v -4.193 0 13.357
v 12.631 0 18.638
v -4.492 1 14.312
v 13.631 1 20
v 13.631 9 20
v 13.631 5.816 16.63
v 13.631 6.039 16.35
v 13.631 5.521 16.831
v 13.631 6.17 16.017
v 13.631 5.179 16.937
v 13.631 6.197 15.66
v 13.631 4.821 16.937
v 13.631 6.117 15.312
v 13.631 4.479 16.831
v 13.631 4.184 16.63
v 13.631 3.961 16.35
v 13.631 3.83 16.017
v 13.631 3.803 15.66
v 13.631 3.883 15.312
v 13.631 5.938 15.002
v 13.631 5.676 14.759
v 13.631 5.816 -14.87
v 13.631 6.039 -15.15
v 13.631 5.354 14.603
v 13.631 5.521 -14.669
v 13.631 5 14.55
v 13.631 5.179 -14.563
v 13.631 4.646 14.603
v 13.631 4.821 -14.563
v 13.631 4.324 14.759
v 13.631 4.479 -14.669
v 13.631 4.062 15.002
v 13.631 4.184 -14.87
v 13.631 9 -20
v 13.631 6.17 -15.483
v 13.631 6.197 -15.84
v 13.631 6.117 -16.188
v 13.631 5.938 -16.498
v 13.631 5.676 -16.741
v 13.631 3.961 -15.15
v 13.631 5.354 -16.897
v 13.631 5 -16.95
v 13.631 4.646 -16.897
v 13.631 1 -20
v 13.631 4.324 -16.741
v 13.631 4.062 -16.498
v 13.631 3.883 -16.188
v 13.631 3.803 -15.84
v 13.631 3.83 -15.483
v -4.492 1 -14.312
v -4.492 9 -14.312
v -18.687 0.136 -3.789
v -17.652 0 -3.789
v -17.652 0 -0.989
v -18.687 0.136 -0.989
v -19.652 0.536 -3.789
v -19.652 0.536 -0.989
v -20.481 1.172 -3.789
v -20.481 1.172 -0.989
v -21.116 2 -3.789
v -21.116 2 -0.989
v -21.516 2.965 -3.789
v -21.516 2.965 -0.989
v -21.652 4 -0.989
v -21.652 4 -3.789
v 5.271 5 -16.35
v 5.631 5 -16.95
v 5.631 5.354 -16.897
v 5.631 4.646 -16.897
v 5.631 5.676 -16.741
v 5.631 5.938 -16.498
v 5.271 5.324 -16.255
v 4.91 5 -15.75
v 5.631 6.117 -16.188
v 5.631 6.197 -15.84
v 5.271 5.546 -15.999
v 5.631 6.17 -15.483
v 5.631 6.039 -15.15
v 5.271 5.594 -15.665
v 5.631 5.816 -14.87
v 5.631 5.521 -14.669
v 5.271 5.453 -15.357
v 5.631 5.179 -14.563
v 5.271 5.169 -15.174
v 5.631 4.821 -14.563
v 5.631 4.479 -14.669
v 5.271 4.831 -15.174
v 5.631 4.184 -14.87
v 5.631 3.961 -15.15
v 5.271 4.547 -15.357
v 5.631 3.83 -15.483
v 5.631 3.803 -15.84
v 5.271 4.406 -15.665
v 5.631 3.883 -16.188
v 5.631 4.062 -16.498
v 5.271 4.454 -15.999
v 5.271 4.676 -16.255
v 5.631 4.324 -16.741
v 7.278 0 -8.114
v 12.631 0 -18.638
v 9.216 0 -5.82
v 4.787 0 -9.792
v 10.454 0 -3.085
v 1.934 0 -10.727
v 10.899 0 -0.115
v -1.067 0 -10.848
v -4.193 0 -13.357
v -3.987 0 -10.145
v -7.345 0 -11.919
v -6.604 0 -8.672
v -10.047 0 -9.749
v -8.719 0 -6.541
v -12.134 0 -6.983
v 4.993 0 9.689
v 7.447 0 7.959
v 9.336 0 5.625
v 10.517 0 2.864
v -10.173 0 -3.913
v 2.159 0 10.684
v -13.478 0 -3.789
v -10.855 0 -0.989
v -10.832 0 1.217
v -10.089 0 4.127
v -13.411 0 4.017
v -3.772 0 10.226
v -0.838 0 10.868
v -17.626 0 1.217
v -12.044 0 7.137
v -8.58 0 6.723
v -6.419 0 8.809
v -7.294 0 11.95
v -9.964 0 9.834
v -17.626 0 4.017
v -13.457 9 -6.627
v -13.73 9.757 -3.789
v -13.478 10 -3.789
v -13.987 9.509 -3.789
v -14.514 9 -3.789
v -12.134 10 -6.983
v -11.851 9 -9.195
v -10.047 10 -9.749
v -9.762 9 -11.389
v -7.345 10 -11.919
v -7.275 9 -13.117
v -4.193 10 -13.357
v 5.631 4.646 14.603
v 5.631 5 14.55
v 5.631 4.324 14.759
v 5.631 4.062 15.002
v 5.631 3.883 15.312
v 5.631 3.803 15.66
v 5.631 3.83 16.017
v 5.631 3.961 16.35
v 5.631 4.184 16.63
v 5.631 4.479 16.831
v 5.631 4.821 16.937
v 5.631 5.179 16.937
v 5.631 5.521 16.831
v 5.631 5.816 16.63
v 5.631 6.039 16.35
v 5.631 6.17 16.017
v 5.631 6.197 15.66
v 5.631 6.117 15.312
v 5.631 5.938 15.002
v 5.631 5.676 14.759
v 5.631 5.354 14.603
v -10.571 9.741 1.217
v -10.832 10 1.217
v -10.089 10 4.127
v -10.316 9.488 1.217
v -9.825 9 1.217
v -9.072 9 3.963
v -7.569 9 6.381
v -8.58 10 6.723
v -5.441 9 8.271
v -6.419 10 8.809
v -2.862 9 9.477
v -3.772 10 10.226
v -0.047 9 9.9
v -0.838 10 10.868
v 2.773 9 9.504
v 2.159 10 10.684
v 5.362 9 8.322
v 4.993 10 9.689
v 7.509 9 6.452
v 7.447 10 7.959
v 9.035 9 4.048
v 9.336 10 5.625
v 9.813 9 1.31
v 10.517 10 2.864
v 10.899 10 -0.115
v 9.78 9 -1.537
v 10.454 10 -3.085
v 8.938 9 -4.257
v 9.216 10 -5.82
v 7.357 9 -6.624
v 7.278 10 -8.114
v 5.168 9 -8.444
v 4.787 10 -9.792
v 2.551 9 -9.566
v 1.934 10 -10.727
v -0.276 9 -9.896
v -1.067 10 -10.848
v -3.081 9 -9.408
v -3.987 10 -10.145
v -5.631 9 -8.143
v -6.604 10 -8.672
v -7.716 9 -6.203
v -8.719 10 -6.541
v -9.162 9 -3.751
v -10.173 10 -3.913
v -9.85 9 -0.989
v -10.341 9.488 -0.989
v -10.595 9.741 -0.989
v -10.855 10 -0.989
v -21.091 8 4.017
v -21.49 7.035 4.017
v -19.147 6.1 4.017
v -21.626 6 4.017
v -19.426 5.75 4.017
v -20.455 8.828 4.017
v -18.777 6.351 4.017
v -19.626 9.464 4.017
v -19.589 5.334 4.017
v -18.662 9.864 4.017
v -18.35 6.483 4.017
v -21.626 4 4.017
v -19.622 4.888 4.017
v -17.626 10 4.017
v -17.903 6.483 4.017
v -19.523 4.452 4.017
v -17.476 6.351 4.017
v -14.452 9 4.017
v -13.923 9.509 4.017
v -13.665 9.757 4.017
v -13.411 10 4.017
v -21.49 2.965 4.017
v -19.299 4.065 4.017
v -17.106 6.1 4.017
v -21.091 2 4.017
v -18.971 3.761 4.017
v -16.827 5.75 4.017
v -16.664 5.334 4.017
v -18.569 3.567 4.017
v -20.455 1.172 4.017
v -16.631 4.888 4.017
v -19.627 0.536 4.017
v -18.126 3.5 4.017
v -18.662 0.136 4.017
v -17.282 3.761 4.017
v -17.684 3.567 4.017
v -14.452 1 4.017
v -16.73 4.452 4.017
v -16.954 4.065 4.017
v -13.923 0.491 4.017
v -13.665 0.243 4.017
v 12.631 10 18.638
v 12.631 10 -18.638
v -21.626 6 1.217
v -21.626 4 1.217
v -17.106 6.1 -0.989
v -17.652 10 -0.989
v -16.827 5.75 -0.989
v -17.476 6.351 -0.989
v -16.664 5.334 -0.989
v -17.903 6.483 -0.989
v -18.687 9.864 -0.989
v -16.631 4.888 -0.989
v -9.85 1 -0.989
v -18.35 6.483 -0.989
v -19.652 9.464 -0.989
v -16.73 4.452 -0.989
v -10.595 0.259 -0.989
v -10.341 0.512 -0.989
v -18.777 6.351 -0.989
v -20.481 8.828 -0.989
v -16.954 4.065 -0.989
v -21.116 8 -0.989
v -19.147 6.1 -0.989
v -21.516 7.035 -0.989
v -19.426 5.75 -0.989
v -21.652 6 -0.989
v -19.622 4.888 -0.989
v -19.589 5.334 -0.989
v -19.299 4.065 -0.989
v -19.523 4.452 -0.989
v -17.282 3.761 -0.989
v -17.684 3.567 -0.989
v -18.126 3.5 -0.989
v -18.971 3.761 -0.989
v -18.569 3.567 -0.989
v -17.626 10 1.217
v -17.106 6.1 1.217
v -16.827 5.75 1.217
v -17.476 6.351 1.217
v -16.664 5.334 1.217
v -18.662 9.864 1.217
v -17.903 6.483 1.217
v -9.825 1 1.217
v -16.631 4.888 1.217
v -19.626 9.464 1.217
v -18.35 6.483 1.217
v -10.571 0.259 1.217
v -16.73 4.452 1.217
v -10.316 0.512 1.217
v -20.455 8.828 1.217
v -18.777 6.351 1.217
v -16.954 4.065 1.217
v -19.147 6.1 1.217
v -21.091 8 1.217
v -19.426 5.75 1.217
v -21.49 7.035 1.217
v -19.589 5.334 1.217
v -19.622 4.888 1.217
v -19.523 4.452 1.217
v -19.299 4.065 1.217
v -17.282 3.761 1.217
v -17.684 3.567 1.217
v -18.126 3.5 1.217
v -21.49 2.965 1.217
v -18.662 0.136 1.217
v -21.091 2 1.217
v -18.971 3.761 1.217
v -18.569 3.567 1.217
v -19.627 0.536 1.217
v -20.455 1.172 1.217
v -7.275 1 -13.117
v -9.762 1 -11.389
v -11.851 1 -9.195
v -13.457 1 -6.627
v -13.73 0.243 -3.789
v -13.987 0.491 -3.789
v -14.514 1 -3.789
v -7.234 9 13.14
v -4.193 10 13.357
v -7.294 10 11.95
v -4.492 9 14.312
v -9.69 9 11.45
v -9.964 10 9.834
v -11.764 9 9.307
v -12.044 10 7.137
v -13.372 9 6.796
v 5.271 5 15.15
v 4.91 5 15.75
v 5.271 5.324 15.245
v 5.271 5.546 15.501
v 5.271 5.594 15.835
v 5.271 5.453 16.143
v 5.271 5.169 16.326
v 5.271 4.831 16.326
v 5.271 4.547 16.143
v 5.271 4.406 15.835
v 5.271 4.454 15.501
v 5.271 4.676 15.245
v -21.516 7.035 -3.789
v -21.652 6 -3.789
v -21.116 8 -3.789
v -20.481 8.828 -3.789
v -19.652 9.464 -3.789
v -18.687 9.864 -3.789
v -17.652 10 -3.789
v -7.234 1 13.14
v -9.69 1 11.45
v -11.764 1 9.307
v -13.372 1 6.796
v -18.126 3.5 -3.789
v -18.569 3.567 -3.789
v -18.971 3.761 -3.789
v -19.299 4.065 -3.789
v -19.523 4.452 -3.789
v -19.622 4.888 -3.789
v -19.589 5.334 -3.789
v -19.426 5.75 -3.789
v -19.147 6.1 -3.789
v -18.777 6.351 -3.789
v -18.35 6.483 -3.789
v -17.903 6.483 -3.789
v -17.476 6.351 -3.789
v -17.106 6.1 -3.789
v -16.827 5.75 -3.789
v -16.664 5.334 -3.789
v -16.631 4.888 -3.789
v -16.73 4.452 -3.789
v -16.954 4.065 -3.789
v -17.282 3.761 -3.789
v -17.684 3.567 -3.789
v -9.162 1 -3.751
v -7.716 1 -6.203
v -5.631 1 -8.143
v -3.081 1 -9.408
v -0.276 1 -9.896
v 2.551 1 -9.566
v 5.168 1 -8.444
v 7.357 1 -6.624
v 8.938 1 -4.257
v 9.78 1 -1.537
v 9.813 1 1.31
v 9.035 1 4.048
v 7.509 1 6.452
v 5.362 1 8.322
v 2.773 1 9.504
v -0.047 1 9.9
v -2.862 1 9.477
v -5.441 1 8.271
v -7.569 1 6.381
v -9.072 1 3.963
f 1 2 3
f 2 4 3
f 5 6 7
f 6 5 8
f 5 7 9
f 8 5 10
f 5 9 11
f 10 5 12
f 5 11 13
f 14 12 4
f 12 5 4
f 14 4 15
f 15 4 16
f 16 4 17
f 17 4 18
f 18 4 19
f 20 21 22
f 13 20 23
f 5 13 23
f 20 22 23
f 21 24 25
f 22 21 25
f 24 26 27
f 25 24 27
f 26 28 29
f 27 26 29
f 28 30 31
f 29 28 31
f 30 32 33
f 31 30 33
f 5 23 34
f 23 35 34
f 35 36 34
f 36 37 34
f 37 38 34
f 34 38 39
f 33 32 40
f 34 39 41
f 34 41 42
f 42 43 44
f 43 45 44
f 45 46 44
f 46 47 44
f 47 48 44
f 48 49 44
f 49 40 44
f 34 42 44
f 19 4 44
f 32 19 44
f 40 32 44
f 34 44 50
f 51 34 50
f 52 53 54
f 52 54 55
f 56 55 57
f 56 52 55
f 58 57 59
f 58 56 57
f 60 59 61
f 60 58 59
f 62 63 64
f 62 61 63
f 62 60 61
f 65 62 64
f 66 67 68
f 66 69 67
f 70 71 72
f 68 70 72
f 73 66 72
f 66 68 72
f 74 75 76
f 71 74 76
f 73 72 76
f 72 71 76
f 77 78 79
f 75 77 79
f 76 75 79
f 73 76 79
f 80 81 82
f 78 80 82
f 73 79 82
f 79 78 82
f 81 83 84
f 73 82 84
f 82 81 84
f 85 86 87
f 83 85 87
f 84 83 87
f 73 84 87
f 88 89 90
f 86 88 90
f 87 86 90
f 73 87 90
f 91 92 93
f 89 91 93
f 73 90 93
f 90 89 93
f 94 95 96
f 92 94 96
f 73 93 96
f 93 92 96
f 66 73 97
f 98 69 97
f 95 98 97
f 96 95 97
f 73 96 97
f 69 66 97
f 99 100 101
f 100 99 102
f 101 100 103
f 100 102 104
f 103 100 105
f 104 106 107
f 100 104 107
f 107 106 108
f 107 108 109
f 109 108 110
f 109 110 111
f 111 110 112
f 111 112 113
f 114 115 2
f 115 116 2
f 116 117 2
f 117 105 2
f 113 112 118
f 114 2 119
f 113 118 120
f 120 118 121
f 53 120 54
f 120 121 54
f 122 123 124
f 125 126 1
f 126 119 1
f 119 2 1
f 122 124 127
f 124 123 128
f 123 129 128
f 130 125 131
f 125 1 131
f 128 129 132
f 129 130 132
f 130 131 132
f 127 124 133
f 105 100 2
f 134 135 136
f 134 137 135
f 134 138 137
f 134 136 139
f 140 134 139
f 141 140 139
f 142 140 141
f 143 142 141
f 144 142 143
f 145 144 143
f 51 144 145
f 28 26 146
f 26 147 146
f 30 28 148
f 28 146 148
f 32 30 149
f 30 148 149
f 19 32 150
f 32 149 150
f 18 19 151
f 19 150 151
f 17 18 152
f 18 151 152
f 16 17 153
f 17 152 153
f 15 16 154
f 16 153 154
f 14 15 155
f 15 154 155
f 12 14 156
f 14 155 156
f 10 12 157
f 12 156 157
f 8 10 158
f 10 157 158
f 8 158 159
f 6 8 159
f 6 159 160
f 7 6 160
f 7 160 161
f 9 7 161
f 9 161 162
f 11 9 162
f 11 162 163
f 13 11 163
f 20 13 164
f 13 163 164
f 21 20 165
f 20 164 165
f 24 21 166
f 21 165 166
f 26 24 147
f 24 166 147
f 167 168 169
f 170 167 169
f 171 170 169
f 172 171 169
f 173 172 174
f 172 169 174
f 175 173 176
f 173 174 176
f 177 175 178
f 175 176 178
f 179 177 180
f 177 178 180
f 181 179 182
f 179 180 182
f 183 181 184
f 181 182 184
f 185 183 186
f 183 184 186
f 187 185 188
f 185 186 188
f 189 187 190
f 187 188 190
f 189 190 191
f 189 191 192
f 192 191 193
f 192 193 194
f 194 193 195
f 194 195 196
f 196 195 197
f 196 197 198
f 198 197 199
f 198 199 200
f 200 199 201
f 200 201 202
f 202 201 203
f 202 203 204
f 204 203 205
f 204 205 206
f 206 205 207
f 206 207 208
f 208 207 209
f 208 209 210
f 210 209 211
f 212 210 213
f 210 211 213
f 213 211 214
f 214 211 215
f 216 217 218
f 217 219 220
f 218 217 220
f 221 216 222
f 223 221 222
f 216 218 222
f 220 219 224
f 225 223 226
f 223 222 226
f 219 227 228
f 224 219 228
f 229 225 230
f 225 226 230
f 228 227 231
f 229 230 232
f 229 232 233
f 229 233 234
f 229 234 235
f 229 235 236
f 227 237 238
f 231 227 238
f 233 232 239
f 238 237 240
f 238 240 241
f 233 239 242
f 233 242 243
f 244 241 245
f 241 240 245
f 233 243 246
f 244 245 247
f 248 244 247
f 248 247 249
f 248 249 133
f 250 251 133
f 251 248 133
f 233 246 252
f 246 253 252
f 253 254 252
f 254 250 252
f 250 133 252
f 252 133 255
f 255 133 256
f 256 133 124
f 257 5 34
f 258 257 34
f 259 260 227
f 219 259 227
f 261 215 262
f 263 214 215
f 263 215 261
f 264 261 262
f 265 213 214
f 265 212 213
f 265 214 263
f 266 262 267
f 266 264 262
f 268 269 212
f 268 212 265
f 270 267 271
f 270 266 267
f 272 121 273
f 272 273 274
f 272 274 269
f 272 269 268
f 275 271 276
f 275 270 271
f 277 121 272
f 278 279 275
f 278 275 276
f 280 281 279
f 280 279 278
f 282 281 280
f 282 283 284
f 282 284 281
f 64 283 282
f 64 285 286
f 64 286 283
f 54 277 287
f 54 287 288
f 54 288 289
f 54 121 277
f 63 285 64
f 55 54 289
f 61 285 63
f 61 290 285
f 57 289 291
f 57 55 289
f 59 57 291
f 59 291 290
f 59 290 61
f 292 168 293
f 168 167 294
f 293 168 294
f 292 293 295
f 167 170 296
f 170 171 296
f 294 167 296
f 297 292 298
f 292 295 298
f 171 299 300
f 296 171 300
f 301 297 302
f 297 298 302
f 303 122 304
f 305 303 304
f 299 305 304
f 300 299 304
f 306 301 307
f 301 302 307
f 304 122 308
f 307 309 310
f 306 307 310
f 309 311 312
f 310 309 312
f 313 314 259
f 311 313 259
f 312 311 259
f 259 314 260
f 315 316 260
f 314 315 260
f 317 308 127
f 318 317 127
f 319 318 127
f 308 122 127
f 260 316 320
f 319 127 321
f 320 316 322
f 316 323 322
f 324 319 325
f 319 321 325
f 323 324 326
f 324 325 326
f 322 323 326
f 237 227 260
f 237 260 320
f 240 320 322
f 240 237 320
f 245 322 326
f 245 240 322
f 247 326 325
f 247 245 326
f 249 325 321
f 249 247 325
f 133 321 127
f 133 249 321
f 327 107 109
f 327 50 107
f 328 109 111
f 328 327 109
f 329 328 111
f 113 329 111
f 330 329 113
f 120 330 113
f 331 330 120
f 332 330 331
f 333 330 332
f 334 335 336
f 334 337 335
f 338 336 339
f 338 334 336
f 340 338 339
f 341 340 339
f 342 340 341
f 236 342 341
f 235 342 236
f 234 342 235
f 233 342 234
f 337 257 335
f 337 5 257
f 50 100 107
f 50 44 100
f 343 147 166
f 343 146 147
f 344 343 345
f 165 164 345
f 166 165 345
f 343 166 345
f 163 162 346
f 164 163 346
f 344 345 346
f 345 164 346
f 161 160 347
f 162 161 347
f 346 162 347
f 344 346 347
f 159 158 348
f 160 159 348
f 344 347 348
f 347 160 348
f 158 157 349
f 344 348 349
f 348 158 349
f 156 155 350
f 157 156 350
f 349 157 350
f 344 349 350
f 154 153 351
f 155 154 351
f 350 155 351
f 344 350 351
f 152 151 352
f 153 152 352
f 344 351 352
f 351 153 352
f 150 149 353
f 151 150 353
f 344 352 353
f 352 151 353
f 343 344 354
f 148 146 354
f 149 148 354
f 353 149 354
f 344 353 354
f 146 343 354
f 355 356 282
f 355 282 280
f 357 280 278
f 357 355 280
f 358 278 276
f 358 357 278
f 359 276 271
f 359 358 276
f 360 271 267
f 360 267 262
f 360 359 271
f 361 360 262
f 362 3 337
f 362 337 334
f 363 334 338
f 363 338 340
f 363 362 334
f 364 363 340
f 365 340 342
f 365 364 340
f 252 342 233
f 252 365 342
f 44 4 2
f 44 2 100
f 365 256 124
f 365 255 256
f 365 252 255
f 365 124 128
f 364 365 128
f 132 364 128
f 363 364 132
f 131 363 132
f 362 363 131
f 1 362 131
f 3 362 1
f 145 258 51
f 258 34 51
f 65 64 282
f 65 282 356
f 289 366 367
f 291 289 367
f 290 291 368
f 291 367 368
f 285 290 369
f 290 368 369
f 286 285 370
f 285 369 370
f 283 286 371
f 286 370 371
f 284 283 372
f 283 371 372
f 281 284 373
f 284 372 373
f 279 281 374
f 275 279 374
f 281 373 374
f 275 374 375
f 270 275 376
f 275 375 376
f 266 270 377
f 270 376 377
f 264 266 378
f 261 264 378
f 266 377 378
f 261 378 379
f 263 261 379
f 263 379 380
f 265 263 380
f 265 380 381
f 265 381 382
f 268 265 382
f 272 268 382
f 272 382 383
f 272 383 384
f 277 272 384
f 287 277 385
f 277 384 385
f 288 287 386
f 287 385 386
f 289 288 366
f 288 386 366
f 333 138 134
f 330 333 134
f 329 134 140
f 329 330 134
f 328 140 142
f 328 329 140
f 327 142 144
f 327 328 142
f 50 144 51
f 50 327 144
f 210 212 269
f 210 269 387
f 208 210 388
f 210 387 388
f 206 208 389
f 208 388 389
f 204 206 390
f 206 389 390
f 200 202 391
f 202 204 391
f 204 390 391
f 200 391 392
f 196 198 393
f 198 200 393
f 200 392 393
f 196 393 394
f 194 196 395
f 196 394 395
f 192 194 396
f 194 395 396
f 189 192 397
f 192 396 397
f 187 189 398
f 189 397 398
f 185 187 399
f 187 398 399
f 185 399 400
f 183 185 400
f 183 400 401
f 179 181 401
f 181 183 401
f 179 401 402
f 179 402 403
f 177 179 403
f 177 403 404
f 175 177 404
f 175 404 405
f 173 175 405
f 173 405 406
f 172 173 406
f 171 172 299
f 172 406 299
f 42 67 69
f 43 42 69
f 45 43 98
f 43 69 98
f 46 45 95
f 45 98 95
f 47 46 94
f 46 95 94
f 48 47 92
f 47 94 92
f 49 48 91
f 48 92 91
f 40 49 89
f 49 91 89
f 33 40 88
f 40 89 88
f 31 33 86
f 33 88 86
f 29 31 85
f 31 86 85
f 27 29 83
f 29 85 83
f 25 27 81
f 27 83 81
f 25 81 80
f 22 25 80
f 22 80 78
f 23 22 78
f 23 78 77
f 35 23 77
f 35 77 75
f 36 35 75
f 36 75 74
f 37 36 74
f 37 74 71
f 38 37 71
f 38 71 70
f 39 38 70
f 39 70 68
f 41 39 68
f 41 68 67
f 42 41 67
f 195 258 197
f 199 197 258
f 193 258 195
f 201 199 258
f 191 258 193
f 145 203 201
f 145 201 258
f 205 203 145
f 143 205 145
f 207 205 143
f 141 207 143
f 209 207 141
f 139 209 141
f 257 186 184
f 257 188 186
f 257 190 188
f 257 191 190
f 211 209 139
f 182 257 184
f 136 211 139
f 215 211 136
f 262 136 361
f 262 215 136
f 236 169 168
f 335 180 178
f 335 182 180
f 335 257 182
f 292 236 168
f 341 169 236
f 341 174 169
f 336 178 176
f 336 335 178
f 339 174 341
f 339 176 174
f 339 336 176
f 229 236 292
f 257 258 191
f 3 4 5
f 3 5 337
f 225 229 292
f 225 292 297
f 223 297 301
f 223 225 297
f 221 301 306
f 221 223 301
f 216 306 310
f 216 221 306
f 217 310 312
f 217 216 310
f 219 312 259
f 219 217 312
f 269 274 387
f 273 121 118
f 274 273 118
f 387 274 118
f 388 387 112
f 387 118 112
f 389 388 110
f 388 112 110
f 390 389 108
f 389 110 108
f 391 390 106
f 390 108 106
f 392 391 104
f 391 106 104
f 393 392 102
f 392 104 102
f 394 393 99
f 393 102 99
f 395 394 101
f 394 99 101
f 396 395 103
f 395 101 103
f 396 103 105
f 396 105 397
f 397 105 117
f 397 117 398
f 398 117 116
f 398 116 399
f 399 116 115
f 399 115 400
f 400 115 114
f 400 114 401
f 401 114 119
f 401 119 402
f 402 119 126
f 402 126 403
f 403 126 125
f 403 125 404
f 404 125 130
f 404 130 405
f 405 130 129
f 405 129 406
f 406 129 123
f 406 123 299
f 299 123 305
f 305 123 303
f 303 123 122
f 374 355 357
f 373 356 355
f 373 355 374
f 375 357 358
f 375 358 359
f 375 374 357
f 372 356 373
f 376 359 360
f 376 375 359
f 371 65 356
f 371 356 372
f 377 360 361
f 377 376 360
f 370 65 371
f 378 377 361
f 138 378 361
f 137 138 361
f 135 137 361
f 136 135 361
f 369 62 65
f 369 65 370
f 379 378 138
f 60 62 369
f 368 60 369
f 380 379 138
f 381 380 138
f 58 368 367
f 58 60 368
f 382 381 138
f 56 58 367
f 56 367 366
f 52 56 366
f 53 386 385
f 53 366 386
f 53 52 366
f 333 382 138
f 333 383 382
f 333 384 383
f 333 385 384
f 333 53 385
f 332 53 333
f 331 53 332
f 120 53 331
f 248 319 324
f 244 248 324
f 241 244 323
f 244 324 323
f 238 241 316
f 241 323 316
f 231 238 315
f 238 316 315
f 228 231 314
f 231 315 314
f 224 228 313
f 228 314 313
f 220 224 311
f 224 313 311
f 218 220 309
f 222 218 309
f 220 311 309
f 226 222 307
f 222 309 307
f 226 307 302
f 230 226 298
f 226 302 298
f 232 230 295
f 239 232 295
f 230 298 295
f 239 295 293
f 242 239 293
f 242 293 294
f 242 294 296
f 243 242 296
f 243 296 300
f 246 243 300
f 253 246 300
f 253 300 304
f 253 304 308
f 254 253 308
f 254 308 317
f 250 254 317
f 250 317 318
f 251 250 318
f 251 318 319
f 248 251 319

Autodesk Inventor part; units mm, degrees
ref_plane "YZ Plane" through (0, 0, 0) normal (1, 0, 0) x (0, 1, 0)
ref_plane "XZ Plane" through (0, 0, 0) normal (0, 1, 0) x (-1, 0, 0)
ref_plane "XY Plane" through (0, 0, 0) normal (0, 0, 1) x (1, 0, 0)
sketch "Эскиз1" plane through (0, 0, 0) normal (0, 1, 0) x (-1, 0, 0)
  arc A0 (9.8249, 1.217) -> (9.8505, -0.9889) centre (0, 0) ccw
  line L0 (-13.6311, 20) -> (-13.6311, -20)
  line L1 (-13.6311, 20) -> (4.492, 14.3116)
  line L2 (-13.6311, -20) -> (4.492, -14.3116)
  line L3 (9.8249, 1.217) -> (16.2051, 1.217)
  line L4 (13.6718, -0.9889) -> (9.8505, -0.9889)
  arc A1 (4.492, -14.3116) -> (14.5136, -3.7889) centre (0, 0) ccw
  arc A2 (14.4521, 4.017) -> (4.492, 14.3116) centre (0, 0) ccw
  line L5 (9.8505, -0.9889) -> (21.6521, -0.9889)
  line L6 (21.6521, -0.9889) -> (21.6521, -3.7889)
  line L7 (21.6521, -3.7889) -> (14.5136, -3.7889)
  line L8 (9.8249, 1.217) -> (21.6265, 1.217)
  line L9 (21.6265, 1.217) -> (21.6265, 4.017)
  line L10 (21.6265, 4.017) -> (14.4521, 4.017)
  point P0 (15, 0)
  dimension "d0" = 19.8
  dimension "d5" = 2.8
  dimension "d6" = 2.8
  dimension "d32" = 15
  dimension "d33" = 40
extrude "Выдавливание1" add sketch "Эскиз1" along normal blind 10
fillet "Сопряжение1" radius 4 4 edges at (-21.6265, 10, 2.617) (-21.6521, 10, -2.3889) (-21.6265, 0, 2.617) (-21.6521, 0, -2.3889)
sketch "Эскиз3" plane through (-14.4521, 0, 4.017) normal (0, 0, 1) x (1, 0, 0)
  arc A0 (-7.1744, 4) -> (-3.1744, 0) centre (-3.1744, 4) ccw projected
  line L0 (-3.1744, 0) -> (0, 0) projected
  line L1 (0, 0) -> (0, 10) projected
  line L2 (-3.1744, 10) -> (0, 10) projected
  arc A1 (-3.1744, 10) -> (-7.1744, 6) centre (-3.1744, 6) ccw projected
  line L3 (-7.1744, 4) -> (-7.1744, 6) projected
  line L4 (-7.1744, 5) -> (-3.6744, 5) construction
  point P0 (14.4521, 0)
  dimension "d20" = 3.5
hole "Отверстие2" at (-18.1265, 5, 4.017) direction (0, 0, -1) diameter 3 depth 8 tip angle 118
chamfer "Фаска1" distance 1 angle 45 12 edges at (9.8993, 10, -0.1148) (9.8993, 0, -0.1148) (4.5696, 10, 17.1558) (13.6311, 10, 0) (4.5696, 10, -17.1558) (-10.8621, 10, -10.3448) (-10.7803, 10, 10.43) (4.5696, 0, 17.1558) (13.6311, 0, 0) (4.5696, 0, -17.1558) (-10.8621, 0, -10.3448) (-10.7803, 0, 10.43)
sketch "Эскиз5" plane through (13.6311, 1, -20) normal (1, 0, 0) x (0, 0, -1)
  line L0 (-40, 0) -> (-40, 8) construction
  line L1 (0, 0) -> (0, 8) construction
  line L2 (-35.75, 4) -> (-40, 4) construction
  line L3 (-4.25, 4) -> (0, 4) construction
  point P0 (-20, -1)
  point P1 (-37.875, 4)
  dimension "d34" = 31.5
hole "Отверстие3" at (13.6311, 5, 15.75) at (13.6311, 5, -15.75) direction (-1, 0, 0) diameter 2.4 depth 8 tip angle 118
properties part number "VoiceMount"
